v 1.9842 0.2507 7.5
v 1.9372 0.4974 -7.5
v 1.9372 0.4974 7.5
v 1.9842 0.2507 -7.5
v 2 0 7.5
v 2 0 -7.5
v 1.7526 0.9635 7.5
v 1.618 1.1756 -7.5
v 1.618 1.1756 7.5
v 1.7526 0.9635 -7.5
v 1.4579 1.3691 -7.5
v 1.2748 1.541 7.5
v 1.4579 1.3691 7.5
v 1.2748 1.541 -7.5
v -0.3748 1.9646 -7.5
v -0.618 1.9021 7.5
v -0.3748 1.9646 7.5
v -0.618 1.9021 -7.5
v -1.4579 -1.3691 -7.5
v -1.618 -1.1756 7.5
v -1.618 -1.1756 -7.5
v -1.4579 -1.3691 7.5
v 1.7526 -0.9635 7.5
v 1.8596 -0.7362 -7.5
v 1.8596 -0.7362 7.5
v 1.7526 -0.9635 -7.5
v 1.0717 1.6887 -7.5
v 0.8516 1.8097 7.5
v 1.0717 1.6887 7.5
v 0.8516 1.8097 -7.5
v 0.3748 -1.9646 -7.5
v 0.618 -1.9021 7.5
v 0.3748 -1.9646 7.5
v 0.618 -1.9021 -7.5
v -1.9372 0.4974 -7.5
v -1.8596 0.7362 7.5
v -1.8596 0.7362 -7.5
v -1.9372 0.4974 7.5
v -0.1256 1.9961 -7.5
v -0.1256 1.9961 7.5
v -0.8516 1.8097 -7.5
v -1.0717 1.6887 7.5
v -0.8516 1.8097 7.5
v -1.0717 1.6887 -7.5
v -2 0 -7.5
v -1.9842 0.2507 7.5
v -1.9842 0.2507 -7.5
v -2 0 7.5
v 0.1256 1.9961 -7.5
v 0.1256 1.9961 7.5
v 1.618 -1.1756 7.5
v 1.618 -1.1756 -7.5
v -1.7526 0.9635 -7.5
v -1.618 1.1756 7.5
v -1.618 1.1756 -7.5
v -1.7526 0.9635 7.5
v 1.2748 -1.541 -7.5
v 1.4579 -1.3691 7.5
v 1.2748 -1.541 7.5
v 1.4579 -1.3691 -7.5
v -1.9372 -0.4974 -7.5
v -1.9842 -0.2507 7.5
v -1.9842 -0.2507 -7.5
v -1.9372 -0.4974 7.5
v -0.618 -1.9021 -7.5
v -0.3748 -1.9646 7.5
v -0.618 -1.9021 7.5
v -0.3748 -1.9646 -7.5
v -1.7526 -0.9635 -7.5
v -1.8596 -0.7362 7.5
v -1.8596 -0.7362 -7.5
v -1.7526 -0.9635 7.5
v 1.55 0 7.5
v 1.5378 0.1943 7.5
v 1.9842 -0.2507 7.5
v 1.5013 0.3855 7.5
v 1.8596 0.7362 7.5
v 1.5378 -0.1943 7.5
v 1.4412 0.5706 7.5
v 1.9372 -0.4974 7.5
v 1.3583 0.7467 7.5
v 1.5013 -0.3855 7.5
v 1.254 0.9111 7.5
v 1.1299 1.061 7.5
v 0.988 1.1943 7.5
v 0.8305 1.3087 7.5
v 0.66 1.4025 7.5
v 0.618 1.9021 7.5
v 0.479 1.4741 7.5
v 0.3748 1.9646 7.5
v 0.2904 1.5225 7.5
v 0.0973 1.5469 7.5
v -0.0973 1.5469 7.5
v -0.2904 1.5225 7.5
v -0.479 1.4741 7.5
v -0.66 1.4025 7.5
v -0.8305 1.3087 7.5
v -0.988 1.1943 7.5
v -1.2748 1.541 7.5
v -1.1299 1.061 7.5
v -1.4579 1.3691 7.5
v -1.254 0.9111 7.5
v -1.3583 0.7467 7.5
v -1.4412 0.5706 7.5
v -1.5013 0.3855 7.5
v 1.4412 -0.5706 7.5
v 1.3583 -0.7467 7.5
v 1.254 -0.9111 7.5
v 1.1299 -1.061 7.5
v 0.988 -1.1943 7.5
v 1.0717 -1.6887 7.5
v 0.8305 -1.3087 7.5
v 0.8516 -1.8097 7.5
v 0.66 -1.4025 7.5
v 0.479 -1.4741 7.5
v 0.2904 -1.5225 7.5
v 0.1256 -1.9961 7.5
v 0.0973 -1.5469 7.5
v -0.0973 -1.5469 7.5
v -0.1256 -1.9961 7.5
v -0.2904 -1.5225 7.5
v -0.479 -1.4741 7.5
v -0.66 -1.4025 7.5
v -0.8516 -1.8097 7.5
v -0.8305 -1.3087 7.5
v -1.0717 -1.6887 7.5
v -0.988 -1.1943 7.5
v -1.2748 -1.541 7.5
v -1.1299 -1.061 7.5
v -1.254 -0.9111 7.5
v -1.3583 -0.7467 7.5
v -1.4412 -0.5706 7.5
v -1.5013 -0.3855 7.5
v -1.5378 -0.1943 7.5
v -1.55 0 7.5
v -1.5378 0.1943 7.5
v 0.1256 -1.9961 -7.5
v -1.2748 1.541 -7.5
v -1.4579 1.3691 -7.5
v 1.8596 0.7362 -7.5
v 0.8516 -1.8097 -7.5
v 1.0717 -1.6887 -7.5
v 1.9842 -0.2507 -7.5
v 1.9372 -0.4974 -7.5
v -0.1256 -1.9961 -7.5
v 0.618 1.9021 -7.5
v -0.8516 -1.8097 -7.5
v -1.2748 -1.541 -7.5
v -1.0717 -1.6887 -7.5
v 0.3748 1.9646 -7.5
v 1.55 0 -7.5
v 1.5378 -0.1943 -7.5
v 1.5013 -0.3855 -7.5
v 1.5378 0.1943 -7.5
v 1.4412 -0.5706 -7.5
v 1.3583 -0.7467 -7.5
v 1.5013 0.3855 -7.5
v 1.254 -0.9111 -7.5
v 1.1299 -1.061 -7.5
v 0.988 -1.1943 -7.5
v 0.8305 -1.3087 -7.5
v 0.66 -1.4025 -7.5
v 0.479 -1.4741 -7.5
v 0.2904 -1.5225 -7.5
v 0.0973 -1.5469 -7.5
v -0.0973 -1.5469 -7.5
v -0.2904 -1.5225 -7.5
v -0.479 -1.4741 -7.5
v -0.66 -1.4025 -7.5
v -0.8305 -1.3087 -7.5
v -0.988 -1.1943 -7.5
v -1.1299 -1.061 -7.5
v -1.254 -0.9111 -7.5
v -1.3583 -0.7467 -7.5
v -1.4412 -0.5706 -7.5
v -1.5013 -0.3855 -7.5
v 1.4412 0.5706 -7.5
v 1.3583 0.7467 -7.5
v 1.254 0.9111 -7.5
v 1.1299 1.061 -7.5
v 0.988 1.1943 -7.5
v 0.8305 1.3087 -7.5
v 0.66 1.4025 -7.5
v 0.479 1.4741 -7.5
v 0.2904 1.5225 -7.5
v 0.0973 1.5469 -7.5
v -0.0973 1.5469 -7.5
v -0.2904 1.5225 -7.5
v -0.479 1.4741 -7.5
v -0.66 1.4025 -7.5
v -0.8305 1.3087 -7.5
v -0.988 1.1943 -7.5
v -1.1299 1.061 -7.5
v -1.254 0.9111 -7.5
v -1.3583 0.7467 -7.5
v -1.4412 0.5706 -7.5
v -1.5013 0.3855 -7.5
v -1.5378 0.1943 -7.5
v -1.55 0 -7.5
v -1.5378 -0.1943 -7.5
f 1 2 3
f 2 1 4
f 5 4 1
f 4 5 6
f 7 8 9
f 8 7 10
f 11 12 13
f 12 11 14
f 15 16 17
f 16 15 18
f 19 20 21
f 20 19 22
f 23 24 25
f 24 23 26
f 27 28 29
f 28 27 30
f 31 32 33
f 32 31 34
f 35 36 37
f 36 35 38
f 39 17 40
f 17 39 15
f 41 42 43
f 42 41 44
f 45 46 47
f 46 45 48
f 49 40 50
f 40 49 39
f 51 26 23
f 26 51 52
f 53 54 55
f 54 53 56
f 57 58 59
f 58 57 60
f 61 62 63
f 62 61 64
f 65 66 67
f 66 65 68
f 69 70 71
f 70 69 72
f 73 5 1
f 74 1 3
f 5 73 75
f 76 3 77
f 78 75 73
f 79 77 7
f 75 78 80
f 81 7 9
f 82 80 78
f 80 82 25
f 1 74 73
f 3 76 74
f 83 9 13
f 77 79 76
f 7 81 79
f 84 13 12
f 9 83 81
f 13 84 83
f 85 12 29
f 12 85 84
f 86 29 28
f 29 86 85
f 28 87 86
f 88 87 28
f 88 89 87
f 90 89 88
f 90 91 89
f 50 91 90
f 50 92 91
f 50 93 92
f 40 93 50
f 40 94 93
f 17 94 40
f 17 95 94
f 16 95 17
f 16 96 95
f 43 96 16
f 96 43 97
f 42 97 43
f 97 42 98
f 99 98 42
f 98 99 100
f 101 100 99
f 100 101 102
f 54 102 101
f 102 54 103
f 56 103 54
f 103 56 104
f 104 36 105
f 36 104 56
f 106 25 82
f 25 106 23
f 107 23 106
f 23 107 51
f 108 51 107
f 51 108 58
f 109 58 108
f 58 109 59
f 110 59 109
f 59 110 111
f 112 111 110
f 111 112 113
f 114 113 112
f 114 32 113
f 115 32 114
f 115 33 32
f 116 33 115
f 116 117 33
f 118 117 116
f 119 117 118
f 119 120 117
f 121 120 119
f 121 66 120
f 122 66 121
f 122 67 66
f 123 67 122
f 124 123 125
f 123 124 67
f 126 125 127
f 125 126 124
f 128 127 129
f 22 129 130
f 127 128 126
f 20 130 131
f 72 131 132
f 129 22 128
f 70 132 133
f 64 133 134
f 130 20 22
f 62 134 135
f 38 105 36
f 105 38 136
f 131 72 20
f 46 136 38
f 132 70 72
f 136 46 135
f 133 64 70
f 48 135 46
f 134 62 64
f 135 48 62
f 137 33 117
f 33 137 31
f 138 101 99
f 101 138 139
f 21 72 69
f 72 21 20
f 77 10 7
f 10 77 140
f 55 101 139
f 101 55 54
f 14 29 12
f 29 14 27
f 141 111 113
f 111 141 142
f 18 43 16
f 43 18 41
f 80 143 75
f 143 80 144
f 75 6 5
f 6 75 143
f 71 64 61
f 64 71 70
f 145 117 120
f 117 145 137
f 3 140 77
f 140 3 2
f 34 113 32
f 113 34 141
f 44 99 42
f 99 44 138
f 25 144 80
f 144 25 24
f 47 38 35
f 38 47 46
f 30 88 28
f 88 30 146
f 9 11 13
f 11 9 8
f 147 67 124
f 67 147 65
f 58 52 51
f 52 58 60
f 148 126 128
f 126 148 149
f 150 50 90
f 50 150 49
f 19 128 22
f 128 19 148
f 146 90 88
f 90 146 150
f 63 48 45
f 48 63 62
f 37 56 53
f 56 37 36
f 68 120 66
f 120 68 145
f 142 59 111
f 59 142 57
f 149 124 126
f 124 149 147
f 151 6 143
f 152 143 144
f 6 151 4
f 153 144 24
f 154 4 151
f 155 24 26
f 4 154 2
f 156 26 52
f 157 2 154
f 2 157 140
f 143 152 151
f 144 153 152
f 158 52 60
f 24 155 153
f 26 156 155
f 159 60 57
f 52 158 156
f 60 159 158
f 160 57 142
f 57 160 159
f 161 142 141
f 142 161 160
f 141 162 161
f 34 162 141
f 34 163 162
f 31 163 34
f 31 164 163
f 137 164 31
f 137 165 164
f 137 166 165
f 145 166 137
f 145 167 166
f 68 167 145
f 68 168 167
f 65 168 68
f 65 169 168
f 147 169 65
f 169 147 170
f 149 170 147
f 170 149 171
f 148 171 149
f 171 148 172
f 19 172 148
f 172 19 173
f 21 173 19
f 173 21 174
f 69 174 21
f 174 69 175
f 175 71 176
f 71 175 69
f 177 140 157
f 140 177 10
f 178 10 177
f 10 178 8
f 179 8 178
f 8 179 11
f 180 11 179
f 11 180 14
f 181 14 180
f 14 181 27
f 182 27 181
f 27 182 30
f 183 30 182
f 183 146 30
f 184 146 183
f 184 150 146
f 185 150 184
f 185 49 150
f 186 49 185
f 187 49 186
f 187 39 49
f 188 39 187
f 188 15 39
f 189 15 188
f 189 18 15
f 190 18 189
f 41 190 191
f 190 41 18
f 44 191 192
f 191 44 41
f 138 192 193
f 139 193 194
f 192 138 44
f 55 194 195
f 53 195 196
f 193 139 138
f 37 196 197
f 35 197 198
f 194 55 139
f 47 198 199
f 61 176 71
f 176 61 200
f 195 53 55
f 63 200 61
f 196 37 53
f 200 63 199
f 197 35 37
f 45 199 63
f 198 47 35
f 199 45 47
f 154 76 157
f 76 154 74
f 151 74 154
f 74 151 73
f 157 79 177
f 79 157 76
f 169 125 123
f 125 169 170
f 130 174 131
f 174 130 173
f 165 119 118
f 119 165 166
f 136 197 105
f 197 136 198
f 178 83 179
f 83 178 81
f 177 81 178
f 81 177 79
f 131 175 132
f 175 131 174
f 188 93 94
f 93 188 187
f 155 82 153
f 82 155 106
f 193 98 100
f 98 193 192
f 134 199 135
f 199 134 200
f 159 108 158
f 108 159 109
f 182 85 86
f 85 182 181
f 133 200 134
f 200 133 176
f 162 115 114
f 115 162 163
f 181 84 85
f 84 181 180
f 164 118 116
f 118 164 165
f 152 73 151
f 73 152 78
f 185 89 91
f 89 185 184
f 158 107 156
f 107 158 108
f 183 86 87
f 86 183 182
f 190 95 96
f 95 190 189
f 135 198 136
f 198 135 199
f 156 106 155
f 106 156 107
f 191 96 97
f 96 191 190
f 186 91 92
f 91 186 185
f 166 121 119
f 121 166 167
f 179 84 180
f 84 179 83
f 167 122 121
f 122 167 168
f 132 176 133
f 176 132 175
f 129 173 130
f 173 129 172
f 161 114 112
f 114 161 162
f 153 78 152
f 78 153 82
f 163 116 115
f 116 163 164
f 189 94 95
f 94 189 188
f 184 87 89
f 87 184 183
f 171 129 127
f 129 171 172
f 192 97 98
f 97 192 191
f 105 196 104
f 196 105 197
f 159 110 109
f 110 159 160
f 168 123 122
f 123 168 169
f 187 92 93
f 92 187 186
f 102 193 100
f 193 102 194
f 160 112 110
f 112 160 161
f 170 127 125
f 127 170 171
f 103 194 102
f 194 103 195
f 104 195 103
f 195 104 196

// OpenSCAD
$fn = 50;


difference() {
	union() {
		translate(v = [0, 0, -7.5000000000]) {
			cylinder(h = 15, r = 2.0000000000);
		}
	}
	union() {
		translate(v = [0, 0, -100.0000000000]) {
			cylinder(h = 200, r = 1.5500000000);
		}
	}
}
